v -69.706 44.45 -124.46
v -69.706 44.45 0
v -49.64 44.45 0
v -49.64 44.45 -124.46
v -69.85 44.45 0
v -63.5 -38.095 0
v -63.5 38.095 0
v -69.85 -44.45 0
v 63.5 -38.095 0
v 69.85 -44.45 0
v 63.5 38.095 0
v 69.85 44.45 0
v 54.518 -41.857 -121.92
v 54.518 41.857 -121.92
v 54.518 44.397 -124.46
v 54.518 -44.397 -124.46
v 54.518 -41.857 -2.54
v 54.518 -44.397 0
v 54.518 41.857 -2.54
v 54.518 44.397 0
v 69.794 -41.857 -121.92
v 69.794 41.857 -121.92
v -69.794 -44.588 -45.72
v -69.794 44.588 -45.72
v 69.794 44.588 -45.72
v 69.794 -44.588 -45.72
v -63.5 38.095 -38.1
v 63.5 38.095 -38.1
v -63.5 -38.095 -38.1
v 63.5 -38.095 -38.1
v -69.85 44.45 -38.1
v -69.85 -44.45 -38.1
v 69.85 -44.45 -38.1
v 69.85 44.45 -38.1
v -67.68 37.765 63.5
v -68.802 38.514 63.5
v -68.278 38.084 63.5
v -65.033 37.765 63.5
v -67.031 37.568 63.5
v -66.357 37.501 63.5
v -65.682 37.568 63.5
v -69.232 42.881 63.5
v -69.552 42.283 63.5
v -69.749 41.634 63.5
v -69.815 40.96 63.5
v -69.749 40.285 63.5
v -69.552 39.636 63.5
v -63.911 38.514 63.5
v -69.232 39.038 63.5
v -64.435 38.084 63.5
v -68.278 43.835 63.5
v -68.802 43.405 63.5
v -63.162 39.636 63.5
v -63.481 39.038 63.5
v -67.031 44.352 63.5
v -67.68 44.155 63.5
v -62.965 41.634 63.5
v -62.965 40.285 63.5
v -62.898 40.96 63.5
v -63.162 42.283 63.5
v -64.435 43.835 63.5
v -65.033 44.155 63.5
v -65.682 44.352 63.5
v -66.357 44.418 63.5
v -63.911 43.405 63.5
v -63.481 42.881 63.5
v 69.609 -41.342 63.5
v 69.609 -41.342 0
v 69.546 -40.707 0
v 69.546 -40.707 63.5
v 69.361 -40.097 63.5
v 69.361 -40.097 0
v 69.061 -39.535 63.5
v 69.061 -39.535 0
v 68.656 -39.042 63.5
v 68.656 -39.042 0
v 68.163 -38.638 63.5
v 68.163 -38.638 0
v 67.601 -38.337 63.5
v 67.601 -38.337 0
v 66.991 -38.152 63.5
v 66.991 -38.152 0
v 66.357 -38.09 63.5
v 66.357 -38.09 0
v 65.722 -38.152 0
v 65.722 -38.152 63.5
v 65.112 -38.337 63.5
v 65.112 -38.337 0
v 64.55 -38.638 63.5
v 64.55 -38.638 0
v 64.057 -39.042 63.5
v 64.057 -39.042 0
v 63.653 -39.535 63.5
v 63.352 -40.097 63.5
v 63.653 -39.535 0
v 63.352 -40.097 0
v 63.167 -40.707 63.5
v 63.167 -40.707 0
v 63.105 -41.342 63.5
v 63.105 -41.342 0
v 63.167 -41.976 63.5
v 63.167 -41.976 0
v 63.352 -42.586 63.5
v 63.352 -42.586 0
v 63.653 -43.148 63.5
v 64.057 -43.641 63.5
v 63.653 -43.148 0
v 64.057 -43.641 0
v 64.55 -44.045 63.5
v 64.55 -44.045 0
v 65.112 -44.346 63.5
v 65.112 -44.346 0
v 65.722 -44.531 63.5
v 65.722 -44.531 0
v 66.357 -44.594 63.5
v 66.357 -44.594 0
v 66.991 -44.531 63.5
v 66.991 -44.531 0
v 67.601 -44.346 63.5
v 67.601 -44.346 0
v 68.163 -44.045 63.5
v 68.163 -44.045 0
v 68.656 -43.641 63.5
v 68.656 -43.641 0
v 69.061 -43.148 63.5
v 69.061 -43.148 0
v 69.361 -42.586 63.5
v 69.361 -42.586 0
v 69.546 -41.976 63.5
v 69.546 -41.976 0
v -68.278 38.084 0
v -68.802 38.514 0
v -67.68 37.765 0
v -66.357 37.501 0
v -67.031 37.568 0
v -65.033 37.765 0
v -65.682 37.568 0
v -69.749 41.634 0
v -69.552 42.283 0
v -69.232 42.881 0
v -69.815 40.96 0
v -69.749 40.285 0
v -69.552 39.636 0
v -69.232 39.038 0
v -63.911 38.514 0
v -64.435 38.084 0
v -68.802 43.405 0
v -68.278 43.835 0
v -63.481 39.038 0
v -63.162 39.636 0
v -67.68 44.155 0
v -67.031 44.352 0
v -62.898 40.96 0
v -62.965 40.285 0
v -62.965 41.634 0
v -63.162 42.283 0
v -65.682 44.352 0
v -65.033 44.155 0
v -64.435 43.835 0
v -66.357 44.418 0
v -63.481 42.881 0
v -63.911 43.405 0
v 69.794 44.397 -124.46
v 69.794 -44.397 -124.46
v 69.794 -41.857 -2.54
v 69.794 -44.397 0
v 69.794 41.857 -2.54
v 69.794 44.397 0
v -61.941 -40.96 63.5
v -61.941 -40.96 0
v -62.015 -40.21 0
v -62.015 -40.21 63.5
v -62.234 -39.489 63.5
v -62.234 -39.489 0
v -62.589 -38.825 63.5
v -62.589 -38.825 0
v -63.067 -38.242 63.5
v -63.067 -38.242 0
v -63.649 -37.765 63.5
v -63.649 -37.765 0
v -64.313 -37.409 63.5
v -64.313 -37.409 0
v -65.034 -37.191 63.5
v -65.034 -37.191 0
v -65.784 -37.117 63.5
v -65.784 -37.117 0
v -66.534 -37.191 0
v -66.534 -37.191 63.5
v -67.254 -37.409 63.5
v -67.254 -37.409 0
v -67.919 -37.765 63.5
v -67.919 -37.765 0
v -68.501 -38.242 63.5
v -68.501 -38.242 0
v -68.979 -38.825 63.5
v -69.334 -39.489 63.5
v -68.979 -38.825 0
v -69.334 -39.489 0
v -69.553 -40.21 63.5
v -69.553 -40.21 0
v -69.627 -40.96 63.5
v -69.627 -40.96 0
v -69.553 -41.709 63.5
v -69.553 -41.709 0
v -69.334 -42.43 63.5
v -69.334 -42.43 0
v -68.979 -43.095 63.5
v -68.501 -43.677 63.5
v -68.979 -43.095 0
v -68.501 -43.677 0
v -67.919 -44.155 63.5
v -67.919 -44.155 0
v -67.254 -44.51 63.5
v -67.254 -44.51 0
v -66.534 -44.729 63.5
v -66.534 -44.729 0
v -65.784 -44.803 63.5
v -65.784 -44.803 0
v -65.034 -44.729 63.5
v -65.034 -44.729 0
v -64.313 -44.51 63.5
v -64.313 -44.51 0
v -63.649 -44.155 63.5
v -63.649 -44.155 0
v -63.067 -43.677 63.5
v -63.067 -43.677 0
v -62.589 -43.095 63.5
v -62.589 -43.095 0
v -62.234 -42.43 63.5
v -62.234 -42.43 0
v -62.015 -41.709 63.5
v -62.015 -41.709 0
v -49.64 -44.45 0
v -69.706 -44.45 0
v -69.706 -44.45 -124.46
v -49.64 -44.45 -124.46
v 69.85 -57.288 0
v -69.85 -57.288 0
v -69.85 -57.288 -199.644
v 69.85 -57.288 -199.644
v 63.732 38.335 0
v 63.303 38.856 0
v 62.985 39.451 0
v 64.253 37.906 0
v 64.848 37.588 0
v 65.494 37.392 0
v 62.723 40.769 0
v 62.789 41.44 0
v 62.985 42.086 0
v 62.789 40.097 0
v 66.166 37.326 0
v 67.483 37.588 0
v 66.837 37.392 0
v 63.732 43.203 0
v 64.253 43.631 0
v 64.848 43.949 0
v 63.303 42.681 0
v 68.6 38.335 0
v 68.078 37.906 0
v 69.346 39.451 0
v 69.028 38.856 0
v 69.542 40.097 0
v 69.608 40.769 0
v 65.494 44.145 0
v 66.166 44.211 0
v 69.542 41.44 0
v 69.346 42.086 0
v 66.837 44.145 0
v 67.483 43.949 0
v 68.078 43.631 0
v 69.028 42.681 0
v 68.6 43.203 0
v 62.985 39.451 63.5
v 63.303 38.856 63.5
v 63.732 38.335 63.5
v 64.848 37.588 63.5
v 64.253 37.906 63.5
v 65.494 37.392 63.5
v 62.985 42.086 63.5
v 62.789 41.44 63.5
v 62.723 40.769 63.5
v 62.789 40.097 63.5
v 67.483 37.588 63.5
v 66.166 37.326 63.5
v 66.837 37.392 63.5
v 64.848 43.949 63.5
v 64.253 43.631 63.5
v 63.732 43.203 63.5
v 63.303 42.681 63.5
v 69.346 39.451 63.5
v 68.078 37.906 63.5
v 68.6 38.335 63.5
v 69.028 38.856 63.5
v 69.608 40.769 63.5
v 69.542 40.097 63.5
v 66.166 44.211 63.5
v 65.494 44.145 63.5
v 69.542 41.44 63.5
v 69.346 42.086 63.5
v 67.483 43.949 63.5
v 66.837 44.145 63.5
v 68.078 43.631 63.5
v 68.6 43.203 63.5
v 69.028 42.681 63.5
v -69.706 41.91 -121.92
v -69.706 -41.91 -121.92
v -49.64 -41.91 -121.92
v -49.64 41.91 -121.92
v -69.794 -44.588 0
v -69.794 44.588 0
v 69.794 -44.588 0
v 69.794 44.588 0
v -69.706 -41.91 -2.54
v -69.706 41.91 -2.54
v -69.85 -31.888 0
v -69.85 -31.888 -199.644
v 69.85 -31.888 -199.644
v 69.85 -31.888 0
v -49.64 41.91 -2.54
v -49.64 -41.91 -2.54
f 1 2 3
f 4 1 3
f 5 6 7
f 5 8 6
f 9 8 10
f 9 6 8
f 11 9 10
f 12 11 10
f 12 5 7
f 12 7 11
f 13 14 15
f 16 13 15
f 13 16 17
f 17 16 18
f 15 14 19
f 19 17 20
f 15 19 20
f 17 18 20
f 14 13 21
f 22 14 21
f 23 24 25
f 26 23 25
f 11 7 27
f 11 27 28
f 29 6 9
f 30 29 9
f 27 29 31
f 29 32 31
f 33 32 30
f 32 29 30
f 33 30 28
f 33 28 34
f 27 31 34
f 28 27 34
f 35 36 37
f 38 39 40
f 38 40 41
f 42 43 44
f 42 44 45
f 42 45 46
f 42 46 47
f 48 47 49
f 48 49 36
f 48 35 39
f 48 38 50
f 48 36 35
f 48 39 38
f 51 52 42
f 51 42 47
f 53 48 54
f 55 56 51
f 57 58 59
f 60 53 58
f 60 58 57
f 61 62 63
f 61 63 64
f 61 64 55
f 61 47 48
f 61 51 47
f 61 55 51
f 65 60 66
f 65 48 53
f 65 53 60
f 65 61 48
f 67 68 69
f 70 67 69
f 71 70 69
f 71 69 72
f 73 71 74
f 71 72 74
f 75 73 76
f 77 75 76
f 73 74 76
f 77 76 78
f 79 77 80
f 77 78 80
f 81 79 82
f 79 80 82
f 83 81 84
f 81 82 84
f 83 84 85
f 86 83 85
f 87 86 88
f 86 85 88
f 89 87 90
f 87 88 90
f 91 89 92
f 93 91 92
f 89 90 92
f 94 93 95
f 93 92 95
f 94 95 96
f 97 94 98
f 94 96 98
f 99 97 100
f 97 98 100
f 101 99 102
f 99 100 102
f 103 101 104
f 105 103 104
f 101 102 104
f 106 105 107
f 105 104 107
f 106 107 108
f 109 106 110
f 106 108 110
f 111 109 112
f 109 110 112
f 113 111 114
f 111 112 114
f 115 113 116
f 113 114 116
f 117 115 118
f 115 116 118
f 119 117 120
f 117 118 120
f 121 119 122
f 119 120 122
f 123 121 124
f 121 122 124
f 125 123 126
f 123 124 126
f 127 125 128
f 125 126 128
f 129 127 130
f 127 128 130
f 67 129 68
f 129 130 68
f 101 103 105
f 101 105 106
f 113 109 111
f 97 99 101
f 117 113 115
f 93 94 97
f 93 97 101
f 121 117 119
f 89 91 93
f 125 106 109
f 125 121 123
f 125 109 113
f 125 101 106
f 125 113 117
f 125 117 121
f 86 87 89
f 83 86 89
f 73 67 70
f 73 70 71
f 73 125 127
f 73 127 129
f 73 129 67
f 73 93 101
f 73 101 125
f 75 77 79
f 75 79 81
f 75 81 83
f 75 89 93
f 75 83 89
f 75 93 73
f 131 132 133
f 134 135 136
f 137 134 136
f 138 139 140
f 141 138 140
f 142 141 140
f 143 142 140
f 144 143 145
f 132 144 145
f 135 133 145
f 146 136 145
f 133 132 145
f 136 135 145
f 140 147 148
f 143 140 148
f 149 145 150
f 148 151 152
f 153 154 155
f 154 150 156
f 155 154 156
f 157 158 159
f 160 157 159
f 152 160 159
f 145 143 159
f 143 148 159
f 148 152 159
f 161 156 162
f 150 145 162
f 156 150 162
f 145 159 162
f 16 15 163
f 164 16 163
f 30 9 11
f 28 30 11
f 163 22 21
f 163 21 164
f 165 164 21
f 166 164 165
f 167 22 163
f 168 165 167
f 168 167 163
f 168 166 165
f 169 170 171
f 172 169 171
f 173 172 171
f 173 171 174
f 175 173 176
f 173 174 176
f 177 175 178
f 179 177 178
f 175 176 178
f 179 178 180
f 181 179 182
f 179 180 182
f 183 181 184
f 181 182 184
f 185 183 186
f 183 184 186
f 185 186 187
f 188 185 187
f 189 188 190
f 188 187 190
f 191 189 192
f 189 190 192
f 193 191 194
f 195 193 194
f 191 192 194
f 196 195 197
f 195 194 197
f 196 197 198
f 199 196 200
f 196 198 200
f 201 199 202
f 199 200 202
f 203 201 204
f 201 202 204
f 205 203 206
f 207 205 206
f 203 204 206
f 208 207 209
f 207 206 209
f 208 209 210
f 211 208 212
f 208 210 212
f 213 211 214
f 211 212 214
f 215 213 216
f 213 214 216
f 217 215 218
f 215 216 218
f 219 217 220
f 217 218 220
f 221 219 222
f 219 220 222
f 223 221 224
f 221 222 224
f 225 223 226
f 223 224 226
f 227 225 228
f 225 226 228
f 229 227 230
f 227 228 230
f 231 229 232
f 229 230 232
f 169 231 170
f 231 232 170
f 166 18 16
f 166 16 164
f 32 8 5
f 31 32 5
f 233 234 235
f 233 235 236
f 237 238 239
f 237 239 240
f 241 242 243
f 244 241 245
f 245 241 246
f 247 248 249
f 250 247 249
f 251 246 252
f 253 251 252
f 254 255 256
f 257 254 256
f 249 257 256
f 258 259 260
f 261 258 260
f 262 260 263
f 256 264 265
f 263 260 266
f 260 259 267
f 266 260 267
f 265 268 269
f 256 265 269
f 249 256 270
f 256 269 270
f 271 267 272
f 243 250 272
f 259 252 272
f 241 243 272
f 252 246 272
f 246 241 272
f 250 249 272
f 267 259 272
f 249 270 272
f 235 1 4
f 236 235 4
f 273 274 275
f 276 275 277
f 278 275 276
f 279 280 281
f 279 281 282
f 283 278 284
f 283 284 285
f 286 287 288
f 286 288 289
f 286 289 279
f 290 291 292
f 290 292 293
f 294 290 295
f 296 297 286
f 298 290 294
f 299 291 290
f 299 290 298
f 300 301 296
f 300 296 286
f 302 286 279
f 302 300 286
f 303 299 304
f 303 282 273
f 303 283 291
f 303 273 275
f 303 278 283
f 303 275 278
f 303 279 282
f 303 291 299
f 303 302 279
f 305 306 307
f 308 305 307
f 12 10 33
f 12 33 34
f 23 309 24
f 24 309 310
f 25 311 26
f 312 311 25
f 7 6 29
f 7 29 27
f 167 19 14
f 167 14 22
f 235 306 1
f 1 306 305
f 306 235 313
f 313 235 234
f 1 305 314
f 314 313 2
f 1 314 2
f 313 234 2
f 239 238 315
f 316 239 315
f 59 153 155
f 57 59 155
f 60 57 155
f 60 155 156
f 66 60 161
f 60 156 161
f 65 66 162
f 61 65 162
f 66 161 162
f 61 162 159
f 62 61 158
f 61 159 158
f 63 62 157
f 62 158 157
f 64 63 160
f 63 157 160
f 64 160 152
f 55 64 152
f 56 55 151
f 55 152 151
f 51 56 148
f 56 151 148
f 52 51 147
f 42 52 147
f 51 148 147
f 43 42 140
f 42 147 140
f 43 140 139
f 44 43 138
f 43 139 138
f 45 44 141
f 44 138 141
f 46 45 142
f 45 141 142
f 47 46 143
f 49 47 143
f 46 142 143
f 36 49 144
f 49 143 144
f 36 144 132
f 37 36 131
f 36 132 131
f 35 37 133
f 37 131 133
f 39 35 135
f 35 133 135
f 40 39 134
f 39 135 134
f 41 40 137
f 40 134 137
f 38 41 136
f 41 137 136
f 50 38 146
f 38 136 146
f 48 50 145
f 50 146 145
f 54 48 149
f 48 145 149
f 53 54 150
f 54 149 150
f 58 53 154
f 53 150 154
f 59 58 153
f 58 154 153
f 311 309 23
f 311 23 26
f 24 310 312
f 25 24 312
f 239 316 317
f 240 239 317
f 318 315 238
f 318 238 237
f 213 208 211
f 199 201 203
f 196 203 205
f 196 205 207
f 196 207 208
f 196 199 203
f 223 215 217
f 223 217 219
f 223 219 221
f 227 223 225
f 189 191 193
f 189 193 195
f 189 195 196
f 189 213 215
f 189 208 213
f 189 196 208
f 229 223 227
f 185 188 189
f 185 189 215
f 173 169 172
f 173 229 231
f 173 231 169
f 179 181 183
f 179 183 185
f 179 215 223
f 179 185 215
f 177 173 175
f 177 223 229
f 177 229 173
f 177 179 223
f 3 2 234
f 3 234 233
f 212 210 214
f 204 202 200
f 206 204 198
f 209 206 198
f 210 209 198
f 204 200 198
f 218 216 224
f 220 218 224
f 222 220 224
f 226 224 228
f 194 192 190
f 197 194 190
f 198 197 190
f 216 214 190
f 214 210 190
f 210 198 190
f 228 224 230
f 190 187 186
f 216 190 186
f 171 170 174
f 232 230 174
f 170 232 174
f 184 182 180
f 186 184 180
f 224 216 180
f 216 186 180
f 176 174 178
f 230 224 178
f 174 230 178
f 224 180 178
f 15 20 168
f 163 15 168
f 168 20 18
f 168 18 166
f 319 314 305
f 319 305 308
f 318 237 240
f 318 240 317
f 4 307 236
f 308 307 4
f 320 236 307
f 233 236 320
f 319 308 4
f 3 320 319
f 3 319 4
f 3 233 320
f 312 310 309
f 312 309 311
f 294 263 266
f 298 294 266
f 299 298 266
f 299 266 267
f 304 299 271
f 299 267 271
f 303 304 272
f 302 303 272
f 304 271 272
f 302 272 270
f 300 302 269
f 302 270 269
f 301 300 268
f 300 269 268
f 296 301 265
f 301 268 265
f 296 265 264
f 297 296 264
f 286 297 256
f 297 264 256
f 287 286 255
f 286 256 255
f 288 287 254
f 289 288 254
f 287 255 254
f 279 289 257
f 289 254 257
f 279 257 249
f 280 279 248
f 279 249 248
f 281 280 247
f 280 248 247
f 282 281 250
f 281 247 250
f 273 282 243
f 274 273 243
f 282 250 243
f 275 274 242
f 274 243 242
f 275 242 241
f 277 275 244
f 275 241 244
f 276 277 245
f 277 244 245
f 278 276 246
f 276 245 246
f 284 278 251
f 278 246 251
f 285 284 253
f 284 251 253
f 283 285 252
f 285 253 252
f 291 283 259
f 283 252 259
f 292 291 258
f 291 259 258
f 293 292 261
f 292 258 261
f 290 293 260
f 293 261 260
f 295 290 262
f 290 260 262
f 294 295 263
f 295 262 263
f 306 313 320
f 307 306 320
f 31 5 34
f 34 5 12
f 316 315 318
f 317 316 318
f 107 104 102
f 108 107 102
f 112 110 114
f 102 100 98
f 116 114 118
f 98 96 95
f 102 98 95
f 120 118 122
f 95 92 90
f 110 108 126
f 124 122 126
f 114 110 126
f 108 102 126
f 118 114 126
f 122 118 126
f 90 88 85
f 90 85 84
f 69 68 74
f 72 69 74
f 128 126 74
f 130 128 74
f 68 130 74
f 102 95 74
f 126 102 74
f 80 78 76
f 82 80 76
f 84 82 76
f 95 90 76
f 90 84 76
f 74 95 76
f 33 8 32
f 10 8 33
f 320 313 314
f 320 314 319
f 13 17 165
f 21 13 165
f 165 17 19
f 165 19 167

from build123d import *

# Parameters (mm, degrees)
F1_R     = 3.4583395998
F2_DEPTH = 63.5
F1_R_2   = 3.4424914459
F1_R_3   = 3.842894975
F1_R_4   = 3.2518430117
F0_W     = 139.7
F0_H     = 88.9
F0_W_2   = 127
F0_H_2   = 76.1909037828
F3_DEPTH = 38.1
F4_W     = 139.5878493786
F4_H     = 89.1758203506
F5_DEPTH = 45.72
F6_W     = 139.7
F6_H     = 25.4
F7_DEPTH = 199.644
F8_W     = 20.066
F8_H     = 88.9
F9_DEPTH = 124.46
F8_W_2   = 15.2763724327
F8_H_2   = 88.7939184904
F10_T    = -2.54
F10_2_T  = -2.54


with BuildPart() as f2:
    # F1 (on Top) → F2 (new body)
    with BuildSketch(Plane.XY):
        with Locations((-66.3567408919, 40.9597717226)):
            Circle(F1_R)
    extrude(amount=F2_DEPTH)


with BuildPart() as f2b:
    # F1 (on Top) → F2, piece 2 (new body)
    with BuildSketch(Plane.XY):
        with Locations((66.1657899618, 40.7688170671)):
            Circle(F1_R_2)
    extrude(amount=F2_DEPTH)


with BuildPart() as f2c:
    # F1 (on Top) → F2, piece 3 (new body)
    with BuildSketch(Plane.XY):
        with Locations((-65.7838732004, -40.9597717226)):
            Circle(F1_R_3)
    extrude(amount=F2_DEPTH)


with BuildPart() as f2d:
    # F1 (on Top) → F2, piece 4 (new body)
    with BuildSketch(Plane.XY):
        with Locations((66.3567408919, -41.3416847587)):
            Circle(F1_R_4)
    extrude(amount=F2_DEPTH)


with BuildPart() as f3:
    # F0 (on Top) → F3 (new body)
    with BuildSketch(Plane.XY):
        Rectangle(F0_W, F0_H)
        Rectangle(F0_W_2, F0_H_2, mode=Mode.SUBTRACT)
    extrude(amount=-F3_DEPTH)


with BuildPart() as f5:
    # F4 (on Top) → F5 (new body)
    with BuildSketch(Plane.XY):
        Rectangle(F4_W, F4_H)
    extrude(amount=-F5_DEPTH)


with BuildPart() as f7:
    # F6 (on Top) → F7 (new body)
    with BuildSketch(Plane.XY):
        with Locations((0, -44.5879101753)):
            Rectangle(F6_W, F6_H)
    extrude(amount=-F7_DEPTH)


with BuildPart() as f9:
    # F8 (on Top) → F9 (new body)
    with BuildSketch(Plane.XY):
        with Locations((-59.6733279526, 0)):
            Rectangle(F8_W, F8_H)
    extrude(amount=-F9_DEPTH)

    # F10
    f10_openings = [f9.faces().sort_by_distance(p)[0] for p in [
        (-69.706328, 0, -62.23),
        (-49.640328, 0, -62.23),
    ]]
    offset(amount=F10_T, openings=f10_openings)


with BuildPart() as f9b:
    # F8 (on Top) → F9, piece 2 (new body)
    with BuildSketch(Plane.XY):
        with Locations((62.1557384729, 0)):
            Rectangle(F8_W_2, F8_H_2)
    extrude(amount=-F9_DEPTH)

    # F10#2
    f10_2_openings = [f9b.faces().sort_by_distance(p)[0] for p in [
        (69.793925, 0, -62.23),
        (54.517552, 0, -62.23),
    ]]
    offset(amount=F10_2_T, openings=f10_2_openings)


solid = Compound([f2.part, f2b.part, f2c.part, f2d.part, f3.part, f5.part, f7.part, f9.part, f9b.part])
